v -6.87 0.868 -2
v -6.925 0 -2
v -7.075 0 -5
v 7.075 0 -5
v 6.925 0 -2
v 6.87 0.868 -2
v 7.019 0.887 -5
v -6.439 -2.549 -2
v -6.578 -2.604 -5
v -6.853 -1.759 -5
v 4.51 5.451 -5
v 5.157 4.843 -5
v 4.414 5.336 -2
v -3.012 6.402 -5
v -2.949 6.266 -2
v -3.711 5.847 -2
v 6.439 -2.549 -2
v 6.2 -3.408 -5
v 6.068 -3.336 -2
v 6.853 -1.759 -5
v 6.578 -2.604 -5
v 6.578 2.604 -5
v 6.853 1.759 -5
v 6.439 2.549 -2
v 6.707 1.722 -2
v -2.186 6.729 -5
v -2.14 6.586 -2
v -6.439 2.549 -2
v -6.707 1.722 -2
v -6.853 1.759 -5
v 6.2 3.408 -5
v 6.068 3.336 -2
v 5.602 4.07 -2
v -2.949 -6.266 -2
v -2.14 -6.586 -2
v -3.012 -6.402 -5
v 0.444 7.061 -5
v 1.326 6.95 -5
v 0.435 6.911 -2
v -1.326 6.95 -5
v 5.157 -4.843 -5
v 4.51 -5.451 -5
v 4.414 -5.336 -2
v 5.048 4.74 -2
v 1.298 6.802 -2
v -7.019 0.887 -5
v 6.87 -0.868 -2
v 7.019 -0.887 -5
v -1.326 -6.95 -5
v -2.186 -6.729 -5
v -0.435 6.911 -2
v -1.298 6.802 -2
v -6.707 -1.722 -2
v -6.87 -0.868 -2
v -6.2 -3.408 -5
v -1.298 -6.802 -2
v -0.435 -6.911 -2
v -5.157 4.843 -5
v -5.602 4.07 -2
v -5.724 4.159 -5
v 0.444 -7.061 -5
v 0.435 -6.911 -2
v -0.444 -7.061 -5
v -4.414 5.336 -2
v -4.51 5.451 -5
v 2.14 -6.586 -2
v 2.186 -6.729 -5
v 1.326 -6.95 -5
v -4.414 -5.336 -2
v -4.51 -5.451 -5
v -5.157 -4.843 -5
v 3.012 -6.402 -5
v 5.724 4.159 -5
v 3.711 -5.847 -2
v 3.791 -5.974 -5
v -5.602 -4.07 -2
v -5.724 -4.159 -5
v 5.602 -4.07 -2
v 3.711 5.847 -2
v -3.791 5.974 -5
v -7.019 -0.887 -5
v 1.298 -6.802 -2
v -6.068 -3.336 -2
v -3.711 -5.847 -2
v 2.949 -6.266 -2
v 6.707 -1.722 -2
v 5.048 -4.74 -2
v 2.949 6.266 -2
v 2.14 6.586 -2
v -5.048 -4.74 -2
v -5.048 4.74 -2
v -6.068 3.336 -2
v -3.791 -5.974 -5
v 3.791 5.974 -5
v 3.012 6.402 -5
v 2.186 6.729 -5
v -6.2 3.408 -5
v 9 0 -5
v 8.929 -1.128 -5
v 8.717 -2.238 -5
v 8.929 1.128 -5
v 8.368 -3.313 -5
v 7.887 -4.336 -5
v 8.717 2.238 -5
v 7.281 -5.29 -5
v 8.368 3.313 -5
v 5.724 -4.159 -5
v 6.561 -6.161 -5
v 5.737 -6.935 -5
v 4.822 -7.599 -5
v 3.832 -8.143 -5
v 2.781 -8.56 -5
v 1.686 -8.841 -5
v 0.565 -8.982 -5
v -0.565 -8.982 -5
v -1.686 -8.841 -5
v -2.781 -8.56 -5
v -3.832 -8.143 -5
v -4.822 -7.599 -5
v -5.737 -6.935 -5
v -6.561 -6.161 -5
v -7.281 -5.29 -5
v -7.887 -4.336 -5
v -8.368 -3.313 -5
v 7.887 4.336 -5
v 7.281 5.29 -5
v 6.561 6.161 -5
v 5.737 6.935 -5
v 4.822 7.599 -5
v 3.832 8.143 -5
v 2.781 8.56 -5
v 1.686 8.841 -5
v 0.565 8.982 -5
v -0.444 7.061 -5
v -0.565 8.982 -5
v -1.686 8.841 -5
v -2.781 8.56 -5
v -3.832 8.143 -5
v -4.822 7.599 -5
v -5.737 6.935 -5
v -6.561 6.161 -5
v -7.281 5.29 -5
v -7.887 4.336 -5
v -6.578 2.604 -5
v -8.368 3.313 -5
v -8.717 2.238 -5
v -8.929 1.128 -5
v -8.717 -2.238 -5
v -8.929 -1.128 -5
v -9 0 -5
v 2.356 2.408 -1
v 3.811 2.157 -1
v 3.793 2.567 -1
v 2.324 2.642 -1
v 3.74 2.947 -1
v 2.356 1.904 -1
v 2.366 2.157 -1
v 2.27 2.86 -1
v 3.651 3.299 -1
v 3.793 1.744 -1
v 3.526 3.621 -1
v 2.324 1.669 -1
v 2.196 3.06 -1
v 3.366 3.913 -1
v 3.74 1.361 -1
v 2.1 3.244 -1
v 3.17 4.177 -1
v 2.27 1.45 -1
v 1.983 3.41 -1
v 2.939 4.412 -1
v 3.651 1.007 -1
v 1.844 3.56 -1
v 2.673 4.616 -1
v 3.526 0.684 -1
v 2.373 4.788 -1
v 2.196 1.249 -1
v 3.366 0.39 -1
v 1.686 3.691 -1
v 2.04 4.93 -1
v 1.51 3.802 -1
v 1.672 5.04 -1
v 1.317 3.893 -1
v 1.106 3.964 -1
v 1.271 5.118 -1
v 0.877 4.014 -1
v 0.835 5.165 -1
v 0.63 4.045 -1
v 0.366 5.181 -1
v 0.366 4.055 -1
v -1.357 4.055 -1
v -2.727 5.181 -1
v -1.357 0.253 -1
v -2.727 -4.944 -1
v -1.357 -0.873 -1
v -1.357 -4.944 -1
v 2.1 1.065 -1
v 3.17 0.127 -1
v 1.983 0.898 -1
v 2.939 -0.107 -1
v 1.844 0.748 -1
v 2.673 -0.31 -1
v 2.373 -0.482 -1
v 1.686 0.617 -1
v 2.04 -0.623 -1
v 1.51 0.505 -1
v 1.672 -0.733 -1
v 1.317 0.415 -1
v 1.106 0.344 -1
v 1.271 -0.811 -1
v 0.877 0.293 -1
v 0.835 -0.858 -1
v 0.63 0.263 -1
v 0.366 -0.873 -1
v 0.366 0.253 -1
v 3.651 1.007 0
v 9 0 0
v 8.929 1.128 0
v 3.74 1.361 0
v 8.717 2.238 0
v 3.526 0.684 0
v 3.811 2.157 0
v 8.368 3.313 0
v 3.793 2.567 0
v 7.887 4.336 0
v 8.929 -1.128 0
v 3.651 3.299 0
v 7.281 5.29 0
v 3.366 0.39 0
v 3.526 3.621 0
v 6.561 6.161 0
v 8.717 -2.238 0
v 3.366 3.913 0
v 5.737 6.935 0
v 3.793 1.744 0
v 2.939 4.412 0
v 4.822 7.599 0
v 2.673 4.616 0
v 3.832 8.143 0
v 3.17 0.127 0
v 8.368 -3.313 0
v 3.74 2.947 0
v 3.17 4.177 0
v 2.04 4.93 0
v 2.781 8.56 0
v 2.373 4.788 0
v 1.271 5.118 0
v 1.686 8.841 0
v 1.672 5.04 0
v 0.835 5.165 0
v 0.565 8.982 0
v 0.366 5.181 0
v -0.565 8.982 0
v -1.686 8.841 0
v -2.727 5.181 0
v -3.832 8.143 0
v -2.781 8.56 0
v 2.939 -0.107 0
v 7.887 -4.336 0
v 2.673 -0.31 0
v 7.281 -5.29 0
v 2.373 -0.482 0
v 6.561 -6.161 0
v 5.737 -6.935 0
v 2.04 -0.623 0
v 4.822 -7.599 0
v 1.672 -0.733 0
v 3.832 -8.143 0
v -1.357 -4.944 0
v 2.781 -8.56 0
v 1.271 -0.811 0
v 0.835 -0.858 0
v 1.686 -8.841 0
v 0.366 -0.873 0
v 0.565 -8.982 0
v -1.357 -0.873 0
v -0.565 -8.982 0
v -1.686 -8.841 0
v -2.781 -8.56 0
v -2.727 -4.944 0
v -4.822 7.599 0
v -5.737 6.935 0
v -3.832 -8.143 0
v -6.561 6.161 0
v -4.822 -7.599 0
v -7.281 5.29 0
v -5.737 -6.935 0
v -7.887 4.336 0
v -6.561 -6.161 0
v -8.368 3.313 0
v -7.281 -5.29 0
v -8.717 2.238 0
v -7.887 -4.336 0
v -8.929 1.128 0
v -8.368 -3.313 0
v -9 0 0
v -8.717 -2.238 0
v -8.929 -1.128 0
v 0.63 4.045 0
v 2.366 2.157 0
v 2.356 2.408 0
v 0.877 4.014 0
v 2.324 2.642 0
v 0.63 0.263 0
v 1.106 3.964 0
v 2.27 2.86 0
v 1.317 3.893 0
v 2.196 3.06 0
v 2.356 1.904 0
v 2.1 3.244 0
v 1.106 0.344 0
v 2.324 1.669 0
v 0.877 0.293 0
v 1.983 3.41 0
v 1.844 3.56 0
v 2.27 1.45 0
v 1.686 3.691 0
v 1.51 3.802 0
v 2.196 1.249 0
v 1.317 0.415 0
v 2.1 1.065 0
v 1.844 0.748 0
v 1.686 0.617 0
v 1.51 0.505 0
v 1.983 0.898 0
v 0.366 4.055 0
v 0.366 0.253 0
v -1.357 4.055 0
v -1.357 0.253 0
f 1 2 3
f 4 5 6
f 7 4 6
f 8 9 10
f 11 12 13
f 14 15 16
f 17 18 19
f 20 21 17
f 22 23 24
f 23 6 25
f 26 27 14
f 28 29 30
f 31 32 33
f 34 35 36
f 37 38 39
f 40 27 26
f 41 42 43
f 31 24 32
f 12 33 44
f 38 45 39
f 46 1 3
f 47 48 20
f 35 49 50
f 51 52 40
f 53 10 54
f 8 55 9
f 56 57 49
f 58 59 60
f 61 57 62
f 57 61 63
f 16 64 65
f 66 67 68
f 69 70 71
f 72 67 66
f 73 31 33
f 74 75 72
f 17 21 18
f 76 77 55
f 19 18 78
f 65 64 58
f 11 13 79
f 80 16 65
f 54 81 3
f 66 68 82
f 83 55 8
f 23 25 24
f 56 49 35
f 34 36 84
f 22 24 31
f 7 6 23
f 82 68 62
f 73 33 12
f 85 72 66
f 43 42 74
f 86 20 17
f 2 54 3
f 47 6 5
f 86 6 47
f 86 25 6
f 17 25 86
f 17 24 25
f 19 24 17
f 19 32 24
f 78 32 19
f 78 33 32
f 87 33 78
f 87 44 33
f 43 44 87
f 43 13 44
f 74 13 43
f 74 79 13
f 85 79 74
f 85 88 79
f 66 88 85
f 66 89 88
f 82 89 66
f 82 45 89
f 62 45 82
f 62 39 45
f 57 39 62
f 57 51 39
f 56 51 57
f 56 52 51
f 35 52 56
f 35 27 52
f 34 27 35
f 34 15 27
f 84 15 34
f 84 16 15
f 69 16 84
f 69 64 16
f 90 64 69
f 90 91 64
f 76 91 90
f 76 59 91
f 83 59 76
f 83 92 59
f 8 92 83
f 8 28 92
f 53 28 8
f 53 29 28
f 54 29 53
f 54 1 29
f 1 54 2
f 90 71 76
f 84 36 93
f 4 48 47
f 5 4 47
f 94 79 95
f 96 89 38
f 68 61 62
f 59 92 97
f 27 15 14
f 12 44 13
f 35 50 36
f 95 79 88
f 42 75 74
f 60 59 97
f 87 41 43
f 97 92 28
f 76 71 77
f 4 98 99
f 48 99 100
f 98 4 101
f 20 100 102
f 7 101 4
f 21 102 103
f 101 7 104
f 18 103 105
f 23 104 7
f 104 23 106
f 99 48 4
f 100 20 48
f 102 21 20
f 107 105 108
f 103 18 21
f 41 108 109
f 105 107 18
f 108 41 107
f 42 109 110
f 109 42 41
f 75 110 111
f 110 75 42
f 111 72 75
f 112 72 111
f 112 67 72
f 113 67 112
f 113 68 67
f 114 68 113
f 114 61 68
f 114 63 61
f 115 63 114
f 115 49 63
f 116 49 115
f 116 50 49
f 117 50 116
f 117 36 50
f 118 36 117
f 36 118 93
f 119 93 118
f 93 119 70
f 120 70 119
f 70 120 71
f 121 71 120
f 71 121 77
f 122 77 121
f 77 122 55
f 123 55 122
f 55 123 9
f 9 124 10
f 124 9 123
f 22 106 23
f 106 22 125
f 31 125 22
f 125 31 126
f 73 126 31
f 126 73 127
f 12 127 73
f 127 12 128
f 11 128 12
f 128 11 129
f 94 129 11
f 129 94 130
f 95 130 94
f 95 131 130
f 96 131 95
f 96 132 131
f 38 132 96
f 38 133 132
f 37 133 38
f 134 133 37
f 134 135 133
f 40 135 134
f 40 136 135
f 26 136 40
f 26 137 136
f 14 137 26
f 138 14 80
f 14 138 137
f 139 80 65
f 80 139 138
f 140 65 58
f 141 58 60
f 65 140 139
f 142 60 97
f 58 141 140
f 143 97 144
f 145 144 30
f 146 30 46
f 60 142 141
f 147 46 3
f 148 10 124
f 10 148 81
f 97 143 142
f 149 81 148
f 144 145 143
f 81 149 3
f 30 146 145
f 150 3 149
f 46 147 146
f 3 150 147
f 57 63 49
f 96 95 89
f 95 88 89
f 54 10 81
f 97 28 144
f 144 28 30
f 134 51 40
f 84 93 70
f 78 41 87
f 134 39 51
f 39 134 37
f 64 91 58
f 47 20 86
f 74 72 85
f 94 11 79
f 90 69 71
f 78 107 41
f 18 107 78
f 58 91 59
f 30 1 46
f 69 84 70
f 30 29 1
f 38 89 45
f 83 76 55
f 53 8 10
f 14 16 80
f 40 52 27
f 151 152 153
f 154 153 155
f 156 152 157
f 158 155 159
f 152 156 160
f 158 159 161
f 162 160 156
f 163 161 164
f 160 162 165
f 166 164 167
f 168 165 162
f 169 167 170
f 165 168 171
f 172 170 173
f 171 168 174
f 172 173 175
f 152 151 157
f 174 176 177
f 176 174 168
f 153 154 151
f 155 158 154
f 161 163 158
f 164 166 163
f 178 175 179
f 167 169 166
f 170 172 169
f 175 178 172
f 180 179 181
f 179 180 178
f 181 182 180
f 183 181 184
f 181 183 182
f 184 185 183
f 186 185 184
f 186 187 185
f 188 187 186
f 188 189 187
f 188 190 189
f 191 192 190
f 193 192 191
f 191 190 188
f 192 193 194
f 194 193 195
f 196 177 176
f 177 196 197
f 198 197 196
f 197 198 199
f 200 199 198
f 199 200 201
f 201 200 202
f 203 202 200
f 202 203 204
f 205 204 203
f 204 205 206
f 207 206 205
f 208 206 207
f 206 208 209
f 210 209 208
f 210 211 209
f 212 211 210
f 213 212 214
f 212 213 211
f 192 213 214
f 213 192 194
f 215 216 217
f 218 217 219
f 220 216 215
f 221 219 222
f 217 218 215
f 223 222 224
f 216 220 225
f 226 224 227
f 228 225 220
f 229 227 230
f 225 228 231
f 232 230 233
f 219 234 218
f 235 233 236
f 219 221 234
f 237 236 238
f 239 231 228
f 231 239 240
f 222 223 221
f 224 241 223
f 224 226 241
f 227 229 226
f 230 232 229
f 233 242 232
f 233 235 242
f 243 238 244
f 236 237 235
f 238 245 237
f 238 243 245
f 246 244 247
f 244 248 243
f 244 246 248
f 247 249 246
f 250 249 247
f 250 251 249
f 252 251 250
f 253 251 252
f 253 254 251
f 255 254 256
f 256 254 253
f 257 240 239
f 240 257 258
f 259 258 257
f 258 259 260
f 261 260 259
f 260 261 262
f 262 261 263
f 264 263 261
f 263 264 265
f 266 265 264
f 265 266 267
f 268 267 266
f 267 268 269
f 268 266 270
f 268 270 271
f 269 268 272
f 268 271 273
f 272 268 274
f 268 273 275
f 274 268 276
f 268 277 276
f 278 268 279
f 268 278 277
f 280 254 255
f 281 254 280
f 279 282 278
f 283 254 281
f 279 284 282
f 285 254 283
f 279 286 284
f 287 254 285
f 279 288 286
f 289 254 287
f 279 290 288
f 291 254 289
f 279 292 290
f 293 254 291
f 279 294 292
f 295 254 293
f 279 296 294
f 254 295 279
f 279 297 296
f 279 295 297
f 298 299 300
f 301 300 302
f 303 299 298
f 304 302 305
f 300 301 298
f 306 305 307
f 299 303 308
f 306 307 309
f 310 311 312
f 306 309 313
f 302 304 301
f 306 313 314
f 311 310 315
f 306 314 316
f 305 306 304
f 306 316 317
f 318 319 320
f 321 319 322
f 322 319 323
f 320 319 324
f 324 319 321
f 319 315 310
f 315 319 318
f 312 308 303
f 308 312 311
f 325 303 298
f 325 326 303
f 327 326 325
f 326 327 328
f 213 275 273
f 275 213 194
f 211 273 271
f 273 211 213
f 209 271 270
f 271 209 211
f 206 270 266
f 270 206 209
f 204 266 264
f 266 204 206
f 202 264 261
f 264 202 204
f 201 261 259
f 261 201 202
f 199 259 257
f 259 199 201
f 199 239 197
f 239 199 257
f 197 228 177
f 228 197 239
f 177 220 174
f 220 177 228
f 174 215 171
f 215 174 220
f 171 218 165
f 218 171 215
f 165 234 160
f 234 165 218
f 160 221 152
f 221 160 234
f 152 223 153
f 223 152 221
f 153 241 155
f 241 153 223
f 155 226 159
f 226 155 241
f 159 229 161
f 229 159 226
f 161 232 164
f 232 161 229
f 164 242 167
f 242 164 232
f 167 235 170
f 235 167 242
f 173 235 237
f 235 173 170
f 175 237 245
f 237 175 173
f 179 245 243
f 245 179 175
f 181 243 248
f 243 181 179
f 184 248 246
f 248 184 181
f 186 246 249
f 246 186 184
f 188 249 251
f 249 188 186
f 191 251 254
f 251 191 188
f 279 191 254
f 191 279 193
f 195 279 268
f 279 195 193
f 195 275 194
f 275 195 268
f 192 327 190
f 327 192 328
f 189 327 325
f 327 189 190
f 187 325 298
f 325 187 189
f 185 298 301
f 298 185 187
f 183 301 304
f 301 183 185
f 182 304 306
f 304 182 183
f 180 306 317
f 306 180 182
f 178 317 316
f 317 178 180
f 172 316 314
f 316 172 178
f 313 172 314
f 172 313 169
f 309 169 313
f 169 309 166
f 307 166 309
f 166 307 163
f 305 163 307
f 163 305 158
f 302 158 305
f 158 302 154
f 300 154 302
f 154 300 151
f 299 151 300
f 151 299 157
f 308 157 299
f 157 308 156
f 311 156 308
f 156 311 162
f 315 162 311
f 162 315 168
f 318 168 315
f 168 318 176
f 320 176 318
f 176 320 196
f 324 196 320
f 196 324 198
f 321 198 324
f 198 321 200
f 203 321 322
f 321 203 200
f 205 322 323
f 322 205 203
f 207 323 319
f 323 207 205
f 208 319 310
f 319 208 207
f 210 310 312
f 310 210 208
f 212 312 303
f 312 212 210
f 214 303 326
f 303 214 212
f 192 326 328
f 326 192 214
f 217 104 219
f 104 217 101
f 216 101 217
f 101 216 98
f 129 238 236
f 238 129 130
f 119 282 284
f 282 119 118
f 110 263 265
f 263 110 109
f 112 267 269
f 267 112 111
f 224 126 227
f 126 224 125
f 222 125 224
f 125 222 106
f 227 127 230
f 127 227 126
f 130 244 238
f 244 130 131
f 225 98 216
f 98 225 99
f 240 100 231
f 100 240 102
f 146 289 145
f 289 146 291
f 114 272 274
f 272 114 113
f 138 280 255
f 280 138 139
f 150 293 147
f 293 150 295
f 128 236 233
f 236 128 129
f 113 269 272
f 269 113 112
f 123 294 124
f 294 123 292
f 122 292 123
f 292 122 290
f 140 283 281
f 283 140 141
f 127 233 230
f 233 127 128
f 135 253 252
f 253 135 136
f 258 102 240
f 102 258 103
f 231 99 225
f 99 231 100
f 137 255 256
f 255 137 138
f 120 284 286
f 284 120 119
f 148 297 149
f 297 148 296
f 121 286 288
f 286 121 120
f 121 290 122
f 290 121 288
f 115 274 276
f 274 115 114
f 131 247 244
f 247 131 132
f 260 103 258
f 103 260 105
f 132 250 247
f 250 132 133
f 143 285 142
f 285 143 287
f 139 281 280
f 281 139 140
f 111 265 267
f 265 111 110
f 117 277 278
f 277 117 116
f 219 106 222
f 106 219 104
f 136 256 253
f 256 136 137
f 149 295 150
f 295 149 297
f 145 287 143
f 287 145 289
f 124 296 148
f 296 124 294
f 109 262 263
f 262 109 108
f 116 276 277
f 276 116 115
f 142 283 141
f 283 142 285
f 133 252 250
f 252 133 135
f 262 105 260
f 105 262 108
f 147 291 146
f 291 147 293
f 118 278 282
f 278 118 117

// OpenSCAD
$fn = 50;


difference() {
	union() {
		translate(v = [0, 0, -5.0000000000]) {
			cylinder(h = 5, r = 9.0000000000);
		}
	}
	union() {
		#translate(v = [0, 0, -5.0000000000]) {
			cylinder(h = 3, r1 = 7.0750000000, r2 = 6.9250000000);
		}
		translate(v = [0, 0, -1]) {
			linear_extrude(height = 1) {
				text(font = "Impact", halign = "center", size = 10, text = "P", valign = "center");
			}
		}
	}
}
